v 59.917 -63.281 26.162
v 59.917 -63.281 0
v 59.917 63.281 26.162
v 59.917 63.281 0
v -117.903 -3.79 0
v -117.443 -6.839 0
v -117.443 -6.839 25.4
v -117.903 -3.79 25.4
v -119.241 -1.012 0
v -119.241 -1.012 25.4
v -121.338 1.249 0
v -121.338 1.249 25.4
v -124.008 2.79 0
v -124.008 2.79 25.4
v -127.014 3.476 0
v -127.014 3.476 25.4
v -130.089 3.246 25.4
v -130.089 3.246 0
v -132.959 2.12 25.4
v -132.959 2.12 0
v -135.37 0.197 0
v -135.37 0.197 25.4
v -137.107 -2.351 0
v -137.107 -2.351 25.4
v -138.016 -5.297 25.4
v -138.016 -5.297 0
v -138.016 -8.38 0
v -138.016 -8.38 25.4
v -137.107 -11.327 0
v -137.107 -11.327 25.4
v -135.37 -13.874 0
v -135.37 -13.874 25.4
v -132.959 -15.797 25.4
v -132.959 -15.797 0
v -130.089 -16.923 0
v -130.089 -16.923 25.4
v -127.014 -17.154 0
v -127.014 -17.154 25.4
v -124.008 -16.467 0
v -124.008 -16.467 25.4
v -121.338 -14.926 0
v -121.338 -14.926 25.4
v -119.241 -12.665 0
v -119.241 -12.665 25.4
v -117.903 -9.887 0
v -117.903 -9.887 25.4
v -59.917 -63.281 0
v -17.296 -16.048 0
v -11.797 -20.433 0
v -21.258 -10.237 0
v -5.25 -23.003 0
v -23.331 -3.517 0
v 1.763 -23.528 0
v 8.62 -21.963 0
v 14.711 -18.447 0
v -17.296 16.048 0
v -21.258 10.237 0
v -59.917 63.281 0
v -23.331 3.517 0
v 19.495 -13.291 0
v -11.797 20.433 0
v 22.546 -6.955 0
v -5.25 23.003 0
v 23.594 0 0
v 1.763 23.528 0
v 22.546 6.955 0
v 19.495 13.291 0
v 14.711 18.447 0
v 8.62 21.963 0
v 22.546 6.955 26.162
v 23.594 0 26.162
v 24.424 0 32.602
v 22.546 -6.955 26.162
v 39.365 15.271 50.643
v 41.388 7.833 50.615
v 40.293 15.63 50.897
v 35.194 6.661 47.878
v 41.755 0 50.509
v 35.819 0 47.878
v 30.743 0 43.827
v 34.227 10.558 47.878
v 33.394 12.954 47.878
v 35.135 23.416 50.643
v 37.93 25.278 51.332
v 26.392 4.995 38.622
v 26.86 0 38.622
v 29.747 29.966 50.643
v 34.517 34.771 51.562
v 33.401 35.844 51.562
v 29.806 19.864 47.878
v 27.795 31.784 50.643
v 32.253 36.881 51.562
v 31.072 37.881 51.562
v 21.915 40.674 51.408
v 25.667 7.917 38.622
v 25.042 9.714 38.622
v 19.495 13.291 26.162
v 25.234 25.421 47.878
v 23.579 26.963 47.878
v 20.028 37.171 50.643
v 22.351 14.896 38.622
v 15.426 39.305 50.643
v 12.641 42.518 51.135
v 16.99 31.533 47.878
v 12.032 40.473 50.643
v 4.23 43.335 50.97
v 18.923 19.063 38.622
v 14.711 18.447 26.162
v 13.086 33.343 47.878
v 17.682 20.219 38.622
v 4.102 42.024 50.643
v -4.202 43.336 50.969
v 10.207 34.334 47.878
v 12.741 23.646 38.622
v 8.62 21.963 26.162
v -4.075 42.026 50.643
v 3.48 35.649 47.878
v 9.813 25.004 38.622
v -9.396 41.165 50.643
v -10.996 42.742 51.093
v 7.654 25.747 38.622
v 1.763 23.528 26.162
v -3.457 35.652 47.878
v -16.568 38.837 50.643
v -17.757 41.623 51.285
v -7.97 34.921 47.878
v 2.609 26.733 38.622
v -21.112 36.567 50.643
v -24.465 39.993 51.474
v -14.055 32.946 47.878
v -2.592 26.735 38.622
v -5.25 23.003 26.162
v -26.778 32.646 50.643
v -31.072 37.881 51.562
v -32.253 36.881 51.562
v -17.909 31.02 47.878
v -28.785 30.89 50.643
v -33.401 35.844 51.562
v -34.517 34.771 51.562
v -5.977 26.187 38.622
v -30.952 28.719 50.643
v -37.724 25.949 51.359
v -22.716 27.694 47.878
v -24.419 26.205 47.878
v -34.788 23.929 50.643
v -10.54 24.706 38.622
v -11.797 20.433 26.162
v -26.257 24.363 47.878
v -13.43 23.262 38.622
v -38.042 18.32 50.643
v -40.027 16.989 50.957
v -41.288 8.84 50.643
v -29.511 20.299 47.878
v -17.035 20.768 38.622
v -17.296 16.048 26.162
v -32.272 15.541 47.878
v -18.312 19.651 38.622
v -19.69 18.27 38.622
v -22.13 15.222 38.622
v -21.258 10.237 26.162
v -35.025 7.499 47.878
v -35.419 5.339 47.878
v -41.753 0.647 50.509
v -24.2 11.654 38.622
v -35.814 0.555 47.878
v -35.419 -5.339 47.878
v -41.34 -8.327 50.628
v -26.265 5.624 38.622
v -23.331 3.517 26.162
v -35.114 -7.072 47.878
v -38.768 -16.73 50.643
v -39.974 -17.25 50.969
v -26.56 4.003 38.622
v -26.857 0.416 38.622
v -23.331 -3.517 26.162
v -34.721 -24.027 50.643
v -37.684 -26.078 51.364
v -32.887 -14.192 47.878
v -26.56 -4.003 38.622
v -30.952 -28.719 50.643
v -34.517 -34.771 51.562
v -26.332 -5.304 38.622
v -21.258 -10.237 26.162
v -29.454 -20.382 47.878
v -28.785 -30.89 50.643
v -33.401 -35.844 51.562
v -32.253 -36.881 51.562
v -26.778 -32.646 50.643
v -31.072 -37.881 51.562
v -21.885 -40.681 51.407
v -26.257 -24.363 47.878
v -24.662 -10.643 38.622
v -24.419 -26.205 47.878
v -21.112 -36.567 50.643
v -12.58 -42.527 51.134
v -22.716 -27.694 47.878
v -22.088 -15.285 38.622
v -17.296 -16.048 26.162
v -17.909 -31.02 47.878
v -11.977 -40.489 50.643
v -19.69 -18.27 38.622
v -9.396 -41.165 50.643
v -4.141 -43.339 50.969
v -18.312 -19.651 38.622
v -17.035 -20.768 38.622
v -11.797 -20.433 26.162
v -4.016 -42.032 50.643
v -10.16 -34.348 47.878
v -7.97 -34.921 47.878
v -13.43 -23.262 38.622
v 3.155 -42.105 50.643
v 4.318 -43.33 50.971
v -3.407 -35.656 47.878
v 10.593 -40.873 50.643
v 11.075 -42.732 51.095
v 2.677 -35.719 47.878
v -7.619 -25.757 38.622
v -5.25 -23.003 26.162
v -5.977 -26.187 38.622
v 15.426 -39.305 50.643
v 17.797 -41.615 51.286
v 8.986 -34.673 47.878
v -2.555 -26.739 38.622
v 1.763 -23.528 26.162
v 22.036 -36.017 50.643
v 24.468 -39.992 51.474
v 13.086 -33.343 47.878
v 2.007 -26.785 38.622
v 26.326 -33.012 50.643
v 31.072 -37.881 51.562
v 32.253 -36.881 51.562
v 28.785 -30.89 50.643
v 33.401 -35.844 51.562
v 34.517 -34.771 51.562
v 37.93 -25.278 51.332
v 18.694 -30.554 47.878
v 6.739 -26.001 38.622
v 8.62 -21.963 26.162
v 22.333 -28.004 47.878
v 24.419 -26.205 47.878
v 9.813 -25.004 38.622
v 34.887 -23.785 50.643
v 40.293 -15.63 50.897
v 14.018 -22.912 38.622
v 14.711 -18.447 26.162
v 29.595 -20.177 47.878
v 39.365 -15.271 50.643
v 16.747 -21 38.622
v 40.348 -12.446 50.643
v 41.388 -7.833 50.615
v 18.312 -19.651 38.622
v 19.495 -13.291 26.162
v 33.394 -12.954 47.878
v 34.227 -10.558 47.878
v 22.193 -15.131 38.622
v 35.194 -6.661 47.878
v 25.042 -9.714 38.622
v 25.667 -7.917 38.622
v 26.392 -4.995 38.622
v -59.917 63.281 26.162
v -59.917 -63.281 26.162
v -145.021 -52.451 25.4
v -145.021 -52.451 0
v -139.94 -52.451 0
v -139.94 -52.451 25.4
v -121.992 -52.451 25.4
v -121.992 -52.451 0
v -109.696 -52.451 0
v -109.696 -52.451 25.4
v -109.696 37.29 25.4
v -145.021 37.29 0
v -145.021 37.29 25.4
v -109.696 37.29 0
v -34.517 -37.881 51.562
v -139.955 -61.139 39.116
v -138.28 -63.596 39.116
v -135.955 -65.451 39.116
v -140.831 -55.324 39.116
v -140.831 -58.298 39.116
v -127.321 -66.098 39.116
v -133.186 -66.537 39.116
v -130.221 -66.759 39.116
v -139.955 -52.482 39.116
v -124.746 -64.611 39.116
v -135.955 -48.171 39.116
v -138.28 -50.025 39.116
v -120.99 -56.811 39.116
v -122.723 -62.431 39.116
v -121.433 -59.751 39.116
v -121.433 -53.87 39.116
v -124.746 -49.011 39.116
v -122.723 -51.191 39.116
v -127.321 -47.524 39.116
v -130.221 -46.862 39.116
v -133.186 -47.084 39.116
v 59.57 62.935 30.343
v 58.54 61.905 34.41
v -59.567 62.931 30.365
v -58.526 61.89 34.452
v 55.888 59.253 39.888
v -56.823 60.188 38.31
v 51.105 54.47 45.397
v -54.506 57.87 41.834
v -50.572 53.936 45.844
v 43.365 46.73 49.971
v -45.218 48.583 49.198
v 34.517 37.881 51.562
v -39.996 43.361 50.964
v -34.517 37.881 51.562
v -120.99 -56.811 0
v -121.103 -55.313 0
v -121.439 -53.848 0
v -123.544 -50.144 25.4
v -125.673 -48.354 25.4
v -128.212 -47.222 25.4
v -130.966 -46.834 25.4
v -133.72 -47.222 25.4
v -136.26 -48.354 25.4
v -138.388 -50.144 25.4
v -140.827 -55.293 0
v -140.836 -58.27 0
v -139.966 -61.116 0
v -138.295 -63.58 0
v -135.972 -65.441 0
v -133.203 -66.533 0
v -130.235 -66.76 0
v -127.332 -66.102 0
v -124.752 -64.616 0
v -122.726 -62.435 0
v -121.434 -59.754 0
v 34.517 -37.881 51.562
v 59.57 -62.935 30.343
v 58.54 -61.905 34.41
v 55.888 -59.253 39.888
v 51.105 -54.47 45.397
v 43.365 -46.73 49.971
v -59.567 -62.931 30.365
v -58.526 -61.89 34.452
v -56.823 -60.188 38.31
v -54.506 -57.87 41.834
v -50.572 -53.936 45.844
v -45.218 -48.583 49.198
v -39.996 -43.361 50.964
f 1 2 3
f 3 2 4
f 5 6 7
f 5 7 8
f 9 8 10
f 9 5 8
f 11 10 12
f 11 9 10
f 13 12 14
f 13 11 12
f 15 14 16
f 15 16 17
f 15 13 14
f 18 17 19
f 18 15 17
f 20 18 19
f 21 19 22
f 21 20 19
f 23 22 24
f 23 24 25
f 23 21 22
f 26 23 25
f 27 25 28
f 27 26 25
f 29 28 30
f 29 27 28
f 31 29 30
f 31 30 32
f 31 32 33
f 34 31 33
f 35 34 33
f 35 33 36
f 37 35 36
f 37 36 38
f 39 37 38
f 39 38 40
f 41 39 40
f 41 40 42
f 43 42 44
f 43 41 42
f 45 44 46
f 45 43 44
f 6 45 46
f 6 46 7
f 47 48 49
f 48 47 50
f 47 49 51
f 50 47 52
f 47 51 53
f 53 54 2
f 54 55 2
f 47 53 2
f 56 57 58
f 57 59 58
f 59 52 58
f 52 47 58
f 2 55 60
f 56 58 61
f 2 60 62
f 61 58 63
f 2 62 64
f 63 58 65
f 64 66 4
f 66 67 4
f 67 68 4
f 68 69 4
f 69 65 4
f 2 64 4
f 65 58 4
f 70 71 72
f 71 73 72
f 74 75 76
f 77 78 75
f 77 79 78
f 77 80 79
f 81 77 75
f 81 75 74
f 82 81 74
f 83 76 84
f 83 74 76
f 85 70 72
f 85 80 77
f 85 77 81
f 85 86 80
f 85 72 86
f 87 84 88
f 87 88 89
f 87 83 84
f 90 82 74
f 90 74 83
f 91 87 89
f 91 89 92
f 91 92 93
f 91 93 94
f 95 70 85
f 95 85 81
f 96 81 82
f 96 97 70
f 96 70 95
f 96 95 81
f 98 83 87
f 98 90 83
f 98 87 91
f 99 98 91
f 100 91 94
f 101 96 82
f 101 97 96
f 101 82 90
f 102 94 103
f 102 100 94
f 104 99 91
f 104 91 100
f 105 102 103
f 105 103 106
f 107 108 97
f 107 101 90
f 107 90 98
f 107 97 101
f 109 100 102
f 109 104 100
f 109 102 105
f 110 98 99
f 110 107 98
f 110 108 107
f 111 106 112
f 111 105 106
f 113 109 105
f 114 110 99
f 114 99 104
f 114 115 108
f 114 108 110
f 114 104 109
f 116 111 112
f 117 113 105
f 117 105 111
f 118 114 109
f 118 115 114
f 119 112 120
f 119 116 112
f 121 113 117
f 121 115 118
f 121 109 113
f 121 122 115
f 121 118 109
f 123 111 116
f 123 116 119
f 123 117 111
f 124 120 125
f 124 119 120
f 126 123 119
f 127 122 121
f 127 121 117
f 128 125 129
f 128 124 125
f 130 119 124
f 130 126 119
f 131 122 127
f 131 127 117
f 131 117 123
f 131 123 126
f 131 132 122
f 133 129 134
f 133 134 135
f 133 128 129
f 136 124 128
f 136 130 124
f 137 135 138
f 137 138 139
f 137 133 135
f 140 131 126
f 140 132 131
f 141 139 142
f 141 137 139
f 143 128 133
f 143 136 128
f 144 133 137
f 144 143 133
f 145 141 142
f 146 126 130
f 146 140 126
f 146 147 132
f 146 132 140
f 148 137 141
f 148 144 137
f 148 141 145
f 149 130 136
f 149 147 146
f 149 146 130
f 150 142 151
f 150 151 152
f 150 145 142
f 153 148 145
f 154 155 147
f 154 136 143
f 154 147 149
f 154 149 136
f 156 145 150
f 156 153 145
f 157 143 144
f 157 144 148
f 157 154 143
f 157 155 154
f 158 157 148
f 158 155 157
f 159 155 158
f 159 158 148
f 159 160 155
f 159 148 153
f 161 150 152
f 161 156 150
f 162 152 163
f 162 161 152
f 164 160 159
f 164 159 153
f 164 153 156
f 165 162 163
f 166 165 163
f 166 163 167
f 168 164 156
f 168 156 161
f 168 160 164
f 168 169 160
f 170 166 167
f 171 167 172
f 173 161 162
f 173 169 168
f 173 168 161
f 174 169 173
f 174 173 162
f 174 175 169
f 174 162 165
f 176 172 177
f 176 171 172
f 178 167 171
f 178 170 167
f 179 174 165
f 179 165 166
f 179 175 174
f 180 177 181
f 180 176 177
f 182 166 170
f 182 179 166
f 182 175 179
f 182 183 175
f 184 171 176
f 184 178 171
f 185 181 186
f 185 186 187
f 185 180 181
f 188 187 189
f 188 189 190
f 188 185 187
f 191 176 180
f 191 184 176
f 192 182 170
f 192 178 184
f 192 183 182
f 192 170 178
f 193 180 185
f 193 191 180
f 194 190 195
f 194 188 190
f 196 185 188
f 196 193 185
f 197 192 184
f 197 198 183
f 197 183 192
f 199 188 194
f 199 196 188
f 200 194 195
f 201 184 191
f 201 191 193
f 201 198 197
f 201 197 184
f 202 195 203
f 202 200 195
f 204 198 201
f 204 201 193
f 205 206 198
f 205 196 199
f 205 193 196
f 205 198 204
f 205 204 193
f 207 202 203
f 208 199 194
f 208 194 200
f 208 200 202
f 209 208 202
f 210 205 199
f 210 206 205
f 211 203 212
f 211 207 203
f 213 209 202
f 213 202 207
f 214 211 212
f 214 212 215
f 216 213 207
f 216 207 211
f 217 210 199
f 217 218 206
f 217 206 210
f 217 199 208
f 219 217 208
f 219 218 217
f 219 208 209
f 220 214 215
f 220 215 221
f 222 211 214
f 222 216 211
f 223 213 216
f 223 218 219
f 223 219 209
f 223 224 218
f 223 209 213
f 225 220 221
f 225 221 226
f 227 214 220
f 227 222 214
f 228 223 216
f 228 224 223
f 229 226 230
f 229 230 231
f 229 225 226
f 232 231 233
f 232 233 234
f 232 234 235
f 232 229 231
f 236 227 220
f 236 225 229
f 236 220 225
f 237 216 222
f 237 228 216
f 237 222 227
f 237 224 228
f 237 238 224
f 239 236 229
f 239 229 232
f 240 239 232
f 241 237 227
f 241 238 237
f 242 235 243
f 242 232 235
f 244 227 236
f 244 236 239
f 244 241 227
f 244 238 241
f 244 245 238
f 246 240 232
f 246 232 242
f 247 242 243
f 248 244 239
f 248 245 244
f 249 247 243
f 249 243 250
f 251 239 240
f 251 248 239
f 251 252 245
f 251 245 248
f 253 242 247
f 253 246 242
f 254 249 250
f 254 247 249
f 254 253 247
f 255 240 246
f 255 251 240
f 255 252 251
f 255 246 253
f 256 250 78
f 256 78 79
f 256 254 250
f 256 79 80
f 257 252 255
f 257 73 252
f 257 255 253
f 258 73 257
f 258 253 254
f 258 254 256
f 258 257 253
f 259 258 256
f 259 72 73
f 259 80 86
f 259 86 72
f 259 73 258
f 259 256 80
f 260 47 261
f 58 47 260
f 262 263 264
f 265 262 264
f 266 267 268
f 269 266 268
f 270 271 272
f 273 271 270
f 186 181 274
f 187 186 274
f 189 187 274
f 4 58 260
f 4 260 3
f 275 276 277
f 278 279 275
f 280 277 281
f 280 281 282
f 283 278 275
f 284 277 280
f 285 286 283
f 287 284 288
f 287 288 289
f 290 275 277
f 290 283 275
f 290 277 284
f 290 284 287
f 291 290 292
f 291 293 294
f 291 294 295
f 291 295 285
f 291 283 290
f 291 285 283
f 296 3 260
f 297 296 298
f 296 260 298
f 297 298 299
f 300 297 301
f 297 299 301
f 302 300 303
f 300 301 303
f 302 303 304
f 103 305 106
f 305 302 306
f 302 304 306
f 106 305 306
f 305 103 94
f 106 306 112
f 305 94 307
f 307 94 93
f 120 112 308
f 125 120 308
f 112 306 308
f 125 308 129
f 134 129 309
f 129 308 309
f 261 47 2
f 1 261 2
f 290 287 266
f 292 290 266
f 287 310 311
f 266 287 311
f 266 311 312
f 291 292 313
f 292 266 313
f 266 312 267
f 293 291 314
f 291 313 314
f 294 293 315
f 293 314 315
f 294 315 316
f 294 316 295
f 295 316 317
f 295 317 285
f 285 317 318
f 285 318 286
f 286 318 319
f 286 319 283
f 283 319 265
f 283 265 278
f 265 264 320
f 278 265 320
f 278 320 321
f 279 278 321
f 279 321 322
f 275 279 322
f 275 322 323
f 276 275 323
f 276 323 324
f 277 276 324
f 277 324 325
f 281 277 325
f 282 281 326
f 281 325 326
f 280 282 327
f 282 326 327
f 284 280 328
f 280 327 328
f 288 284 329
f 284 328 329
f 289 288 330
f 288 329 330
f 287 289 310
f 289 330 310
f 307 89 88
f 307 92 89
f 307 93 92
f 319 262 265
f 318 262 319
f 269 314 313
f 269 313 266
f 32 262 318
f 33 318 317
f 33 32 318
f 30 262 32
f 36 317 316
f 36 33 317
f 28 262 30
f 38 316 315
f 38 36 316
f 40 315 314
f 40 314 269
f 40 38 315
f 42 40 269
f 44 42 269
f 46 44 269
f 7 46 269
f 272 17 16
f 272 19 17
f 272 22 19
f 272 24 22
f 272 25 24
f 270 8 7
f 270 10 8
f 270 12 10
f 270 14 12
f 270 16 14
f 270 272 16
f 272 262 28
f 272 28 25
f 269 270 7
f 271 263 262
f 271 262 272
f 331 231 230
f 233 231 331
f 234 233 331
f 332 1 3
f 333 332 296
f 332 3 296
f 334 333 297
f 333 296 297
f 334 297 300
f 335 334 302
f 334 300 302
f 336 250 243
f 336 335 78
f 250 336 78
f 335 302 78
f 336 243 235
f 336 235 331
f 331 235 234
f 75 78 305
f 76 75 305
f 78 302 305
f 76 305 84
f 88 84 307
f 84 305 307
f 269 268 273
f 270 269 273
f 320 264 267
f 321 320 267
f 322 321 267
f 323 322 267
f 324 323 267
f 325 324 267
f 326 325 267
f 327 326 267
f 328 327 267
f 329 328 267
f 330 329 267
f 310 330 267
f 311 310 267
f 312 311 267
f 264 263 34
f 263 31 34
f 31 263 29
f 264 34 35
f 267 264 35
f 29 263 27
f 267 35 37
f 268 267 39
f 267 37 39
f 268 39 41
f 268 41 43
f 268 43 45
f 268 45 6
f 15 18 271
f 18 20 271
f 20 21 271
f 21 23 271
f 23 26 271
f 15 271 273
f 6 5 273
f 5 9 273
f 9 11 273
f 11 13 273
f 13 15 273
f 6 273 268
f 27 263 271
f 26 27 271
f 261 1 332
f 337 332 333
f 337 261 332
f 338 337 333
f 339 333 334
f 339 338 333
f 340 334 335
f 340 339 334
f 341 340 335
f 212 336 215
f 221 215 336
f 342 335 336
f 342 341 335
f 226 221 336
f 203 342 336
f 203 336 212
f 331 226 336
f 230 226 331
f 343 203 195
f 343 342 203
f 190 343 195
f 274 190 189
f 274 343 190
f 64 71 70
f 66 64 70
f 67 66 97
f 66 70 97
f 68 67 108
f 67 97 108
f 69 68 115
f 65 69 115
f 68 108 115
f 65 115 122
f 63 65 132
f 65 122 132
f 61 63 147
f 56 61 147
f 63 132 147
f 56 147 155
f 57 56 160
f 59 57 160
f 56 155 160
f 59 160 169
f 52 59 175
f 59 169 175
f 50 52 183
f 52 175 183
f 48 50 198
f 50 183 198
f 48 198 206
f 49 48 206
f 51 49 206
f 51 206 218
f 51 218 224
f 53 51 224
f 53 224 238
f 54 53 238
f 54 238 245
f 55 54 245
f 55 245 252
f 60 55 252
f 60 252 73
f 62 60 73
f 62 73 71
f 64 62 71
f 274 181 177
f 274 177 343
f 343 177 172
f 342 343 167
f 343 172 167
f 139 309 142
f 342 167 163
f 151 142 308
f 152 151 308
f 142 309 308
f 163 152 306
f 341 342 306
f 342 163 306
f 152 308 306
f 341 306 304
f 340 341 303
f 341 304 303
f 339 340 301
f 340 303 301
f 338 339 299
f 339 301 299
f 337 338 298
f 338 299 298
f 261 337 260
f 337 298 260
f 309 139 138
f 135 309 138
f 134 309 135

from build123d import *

# Parameters (mm, degrees)
F0_W        = 119.8333874345
F0_H        = 126.5625059605
F1_DEPTH    = 51.562
F2_R        = 23.5942925728
F3_DEPTH    = 115.824
F4_T1_DEPTH = 253.5625059605
F4_T3_DEPTH = 246.8333874345
F5_W        = 35.3249832988
F5_H        = 89.741922915
F5_R        = 10.343883472
F6_DEPTH    = 25.4
F7_R        = 9.9766133663
F8_DEPTH    = 39.116


# Not quite as in the source:
# - a fillet or chamfer that OpenCascade refuses, or shapes differently, is made with other operations: its cross-section is extruded or revolved along the edge and cut away or added


with BuildPart() as f1:
    # F0 (on Top) → F1 (new body)
    with BuildSketch(Plane.XY):
        Rectangle(F0_W, F0_H)
    extrude(amount=F1_DEPTH)

    # F2 (on face) → F3 (cut)
    with BuildSketch(Plane.XY.offset(51.562)):
        Circle(F2_R)
    extrude(amount=-F3_DEPTH, mode=Mode.SUBTRACT)

    # F4: fillet of radius 25.4 on 5 edges, made by hand

    # F4_s2 → F4_t1 (cut)
    with BuildSketch(Plane.XZ.offset(-126.7812529802)):
        with BuildLine():
            ThreePointArc((59.9166937172, 26.162), (52.4772059594, 44.1225122421), (34.5166937172, 51.562))
            Line((34.5166937172, 51.562), (59.9166937172, 51.562))
            Line((59.9166937172, 51.562), (59.9166937172, 26.162))
        make_face()
        with BuildLine():
            ThreePointArc((-34.5166937172, 51.562), (-52.4772059594, 44.1225122421), (-59.9166937172, 26.162))
            Line((-59.9166937172, 26.162), (-59.9166937172, 51.562))
            Line((-59.9166937172, 51.562), (-34.5166937172, 51.562))
        make_face()
    extrude(amount=F4_T1_DEPTH, mode=Mode.SUBTRACT)

    # F4_s4 → F4_t3 (cut)
    with BuildSketch(Plane.YZ.offset(-123.4166937172)):
        with BuildLine():
            ThreePointArc((-63.2812529802, 26.162), (-55.8417652224, 44.1225122421), (-37.8812529802, 51.562))
            Line((-37.8812529802, 51.562), (-63.2812529802, 51.562))
            Line((-63.2812529802, 51.562), (-63.2812529802, 26.162))
        make_face()
        with BuildLine():
            ThreePointArc((63.2812529802, 26.162), (55.8417652224, 44.1225122421), (37.8812529802, 51.562))
            Line((37.8812529802, 51.562), (63.2812529802, 51.562))
            Line((63.2812529802, 51.562), (63.2812529802, 26.162))
        make_face()
    extrude(amount=F4_T3_DEPTH, mode=Mode.SUBTRACT)

    # F4_s5 → F4_t6 (revolve, cut)
    with BuildSketch(Plane.XZ):
        with BuildLine():
            ThreePointArc((48.9942925728, 51.562), (31.0337803306, 44.1225122421), (23.5942925728, 26.162))
            Line((23.5942925728, 26.162), (23.5942925728, 51.562))
            Line((23.5942925728, 51.562), (48.9942925728, 51.562))
        make_face()
    revolve(axis=Axis((0, 0, 51.562), (0, 0, 1)), mode=Mode.SUBTRACT)


with BuildPart() as f6:
    # F5 (on Top) → F6 (new body)
    with BuildSketch(Plane.XY):
        with Locations((-127.3588873446, -7.5805075467)):
            Rectangle(F5_W, F5_H)
        with Locations((-127.7872473001, -6.8385624327)):
            Circle(F5_R, mode=Mode.SUBTRACT)
    extrude(amount=F6_DEPTH)

    # F7 (on Top) → F8 (join)
    with BuildSketch(Plane.XY):
        with Locations((-130.9662014246, -56.8105876446)):
            Circle(F7_R)
    extrude(amount=F8_DEPTH)


solid = Compound([f1.part, f6.part])
